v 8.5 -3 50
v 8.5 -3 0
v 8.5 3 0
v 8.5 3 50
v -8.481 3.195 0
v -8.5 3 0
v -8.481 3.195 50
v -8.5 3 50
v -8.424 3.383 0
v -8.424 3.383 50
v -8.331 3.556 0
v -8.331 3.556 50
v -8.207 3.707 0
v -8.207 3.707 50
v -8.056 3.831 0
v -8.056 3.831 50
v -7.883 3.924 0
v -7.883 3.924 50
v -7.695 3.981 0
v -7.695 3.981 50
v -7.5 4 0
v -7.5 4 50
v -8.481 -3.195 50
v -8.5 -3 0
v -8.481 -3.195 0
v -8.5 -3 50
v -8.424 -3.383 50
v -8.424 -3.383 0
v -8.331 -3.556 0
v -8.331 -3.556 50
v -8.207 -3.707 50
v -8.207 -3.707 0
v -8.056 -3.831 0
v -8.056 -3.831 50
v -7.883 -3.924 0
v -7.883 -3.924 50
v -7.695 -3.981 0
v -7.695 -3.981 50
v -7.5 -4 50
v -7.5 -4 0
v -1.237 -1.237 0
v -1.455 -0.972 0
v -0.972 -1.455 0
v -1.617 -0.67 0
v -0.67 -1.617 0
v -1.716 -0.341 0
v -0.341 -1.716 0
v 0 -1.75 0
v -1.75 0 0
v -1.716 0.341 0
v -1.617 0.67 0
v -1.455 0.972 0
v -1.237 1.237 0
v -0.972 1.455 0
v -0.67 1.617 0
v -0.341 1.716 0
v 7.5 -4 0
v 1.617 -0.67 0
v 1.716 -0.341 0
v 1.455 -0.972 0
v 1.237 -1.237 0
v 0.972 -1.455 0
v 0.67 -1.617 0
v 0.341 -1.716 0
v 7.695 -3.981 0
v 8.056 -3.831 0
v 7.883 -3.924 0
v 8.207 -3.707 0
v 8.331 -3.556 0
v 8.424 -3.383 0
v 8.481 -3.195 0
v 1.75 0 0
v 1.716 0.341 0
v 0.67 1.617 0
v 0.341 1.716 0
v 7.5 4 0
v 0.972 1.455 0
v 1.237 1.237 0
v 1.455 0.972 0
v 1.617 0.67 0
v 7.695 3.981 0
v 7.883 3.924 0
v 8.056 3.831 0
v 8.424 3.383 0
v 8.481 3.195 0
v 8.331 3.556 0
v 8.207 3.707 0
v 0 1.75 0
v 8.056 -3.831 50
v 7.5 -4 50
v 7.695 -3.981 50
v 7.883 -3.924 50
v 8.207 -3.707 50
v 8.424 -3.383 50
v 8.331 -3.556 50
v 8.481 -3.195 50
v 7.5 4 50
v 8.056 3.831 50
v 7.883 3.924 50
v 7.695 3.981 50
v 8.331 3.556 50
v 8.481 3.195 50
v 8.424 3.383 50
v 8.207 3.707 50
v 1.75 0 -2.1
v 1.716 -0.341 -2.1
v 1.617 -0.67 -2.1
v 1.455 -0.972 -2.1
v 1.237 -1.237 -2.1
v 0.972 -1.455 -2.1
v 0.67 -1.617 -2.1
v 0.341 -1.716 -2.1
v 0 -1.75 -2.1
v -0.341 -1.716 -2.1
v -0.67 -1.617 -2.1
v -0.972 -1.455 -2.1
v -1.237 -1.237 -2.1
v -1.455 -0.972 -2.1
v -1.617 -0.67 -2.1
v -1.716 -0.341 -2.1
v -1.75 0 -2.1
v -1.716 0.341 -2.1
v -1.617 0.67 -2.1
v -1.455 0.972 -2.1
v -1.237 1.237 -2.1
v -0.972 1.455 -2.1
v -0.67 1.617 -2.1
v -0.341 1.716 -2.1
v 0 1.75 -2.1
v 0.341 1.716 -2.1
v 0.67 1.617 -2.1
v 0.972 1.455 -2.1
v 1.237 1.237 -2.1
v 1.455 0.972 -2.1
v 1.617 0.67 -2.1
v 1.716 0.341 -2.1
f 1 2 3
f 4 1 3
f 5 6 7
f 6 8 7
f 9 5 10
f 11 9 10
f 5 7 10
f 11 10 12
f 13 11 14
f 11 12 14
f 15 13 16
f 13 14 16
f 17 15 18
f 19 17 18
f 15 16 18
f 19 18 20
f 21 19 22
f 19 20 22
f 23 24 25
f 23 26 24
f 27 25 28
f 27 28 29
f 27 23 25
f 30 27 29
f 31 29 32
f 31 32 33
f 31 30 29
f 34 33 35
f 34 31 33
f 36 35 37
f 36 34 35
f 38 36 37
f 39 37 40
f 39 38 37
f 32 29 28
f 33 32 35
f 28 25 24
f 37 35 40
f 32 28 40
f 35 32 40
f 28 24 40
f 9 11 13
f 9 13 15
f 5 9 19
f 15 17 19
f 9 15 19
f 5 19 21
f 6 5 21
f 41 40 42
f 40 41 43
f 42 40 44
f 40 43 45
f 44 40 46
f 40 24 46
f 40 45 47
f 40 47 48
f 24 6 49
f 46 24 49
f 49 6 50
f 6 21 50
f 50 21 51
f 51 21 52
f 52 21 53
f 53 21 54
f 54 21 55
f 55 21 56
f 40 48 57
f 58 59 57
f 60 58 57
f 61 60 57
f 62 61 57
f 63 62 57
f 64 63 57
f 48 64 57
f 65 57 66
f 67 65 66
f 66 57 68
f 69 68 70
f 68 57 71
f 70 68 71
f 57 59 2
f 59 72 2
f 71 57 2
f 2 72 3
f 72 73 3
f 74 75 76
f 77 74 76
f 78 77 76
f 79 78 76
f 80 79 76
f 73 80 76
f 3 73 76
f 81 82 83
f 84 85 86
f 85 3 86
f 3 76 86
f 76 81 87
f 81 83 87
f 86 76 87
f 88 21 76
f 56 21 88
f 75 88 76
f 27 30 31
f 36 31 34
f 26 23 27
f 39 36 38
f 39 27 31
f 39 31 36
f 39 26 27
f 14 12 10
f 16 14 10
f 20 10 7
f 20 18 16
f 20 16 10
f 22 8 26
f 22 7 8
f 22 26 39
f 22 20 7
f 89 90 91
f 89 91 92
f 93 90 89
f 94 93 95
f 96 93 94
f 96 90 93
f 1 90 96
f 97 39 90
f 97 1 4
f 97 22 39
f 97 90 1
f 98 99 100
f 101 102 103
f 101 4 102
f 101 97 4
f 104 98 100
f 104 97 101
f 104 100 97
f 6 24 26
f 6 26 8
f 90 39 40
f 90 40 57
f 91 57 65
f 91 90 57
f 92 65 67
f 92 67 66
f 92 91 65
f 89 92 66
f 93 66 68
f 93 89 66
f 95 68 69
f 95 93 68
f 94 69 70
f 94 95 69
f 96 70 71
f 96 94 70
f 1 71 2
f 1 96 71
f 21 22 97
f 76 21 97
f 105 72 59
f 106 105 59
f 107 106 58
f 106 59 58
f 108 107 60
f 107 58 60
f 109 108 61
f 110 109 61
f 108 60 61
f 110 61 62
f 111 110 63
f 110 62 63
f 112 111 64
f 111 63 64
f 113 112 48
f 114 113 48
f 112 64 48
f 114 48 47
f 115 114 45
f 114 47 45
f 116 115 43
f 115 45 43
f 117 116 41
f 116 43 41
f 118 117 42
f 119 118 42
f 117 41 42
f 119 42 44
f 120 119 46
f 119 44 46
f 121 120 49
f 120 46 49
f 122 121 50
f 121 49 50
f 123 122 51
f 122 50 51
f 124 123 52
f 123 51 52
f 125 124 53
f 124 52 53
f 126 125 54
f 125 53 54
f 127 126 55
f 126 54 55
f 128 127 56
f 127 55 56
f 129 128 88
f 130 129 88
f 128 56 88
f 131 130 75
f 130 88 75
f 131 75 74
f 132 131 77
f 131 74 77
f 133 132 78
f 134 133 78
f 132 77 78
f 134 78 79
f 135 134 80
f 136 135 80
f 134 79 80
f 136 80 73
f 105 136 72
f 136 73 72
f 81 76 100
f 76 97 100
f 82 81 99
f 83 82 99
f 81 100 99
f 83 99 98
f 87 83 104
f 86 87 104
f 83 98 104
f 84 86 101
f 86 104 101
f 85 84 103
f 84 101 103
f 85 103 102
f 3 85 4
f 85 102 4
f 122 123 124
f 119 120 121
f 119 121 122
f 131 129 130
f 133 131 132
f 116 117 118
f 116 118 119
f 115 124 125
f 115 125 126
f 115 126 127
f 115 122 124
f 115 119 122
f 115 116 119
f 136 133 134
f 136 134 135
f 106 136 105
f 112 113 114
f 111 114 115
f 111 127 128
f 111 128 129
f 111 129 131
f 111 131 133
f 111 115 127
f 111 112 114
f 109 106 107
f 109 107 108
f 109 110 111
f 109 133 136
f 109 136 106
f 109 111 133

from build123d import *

# Parameters (mm, degrees)
F0_W     = 17
F0_H     = 8
F1_DEPTH = 50
F2_R     = 1.75
F3_DEPTH = 2.1
F4_R     = 1


with BuildPart() as f1:
    # F0 (on Top) → F1 (new body)
    with BuildSketch(Plane.XY):
        Rectangle(F0_W, F0_H)
    extrude(amount=F1_DEPTH)

    # F2 (on face) → F3 (join)
    with BuildSketch(Plane(origin=(0, 0, 0), x_dir=(1, 0, 0), z_dir=(0, 0, -1))):
        Circle(F2_R)
    extrude(amount=F3_DEPTH)

    # F4
    f4_edges = [f1.edges().sort_by_distance(p)[0] for p in [
        (-8.5, 4, 25),
        (8.5, 4, 25),
        (8.5, -4, 25),
        (-8.5, -4, 25),
    ]]
    fillet(f4_edges, radius=F4_R)


solid = f1.part
